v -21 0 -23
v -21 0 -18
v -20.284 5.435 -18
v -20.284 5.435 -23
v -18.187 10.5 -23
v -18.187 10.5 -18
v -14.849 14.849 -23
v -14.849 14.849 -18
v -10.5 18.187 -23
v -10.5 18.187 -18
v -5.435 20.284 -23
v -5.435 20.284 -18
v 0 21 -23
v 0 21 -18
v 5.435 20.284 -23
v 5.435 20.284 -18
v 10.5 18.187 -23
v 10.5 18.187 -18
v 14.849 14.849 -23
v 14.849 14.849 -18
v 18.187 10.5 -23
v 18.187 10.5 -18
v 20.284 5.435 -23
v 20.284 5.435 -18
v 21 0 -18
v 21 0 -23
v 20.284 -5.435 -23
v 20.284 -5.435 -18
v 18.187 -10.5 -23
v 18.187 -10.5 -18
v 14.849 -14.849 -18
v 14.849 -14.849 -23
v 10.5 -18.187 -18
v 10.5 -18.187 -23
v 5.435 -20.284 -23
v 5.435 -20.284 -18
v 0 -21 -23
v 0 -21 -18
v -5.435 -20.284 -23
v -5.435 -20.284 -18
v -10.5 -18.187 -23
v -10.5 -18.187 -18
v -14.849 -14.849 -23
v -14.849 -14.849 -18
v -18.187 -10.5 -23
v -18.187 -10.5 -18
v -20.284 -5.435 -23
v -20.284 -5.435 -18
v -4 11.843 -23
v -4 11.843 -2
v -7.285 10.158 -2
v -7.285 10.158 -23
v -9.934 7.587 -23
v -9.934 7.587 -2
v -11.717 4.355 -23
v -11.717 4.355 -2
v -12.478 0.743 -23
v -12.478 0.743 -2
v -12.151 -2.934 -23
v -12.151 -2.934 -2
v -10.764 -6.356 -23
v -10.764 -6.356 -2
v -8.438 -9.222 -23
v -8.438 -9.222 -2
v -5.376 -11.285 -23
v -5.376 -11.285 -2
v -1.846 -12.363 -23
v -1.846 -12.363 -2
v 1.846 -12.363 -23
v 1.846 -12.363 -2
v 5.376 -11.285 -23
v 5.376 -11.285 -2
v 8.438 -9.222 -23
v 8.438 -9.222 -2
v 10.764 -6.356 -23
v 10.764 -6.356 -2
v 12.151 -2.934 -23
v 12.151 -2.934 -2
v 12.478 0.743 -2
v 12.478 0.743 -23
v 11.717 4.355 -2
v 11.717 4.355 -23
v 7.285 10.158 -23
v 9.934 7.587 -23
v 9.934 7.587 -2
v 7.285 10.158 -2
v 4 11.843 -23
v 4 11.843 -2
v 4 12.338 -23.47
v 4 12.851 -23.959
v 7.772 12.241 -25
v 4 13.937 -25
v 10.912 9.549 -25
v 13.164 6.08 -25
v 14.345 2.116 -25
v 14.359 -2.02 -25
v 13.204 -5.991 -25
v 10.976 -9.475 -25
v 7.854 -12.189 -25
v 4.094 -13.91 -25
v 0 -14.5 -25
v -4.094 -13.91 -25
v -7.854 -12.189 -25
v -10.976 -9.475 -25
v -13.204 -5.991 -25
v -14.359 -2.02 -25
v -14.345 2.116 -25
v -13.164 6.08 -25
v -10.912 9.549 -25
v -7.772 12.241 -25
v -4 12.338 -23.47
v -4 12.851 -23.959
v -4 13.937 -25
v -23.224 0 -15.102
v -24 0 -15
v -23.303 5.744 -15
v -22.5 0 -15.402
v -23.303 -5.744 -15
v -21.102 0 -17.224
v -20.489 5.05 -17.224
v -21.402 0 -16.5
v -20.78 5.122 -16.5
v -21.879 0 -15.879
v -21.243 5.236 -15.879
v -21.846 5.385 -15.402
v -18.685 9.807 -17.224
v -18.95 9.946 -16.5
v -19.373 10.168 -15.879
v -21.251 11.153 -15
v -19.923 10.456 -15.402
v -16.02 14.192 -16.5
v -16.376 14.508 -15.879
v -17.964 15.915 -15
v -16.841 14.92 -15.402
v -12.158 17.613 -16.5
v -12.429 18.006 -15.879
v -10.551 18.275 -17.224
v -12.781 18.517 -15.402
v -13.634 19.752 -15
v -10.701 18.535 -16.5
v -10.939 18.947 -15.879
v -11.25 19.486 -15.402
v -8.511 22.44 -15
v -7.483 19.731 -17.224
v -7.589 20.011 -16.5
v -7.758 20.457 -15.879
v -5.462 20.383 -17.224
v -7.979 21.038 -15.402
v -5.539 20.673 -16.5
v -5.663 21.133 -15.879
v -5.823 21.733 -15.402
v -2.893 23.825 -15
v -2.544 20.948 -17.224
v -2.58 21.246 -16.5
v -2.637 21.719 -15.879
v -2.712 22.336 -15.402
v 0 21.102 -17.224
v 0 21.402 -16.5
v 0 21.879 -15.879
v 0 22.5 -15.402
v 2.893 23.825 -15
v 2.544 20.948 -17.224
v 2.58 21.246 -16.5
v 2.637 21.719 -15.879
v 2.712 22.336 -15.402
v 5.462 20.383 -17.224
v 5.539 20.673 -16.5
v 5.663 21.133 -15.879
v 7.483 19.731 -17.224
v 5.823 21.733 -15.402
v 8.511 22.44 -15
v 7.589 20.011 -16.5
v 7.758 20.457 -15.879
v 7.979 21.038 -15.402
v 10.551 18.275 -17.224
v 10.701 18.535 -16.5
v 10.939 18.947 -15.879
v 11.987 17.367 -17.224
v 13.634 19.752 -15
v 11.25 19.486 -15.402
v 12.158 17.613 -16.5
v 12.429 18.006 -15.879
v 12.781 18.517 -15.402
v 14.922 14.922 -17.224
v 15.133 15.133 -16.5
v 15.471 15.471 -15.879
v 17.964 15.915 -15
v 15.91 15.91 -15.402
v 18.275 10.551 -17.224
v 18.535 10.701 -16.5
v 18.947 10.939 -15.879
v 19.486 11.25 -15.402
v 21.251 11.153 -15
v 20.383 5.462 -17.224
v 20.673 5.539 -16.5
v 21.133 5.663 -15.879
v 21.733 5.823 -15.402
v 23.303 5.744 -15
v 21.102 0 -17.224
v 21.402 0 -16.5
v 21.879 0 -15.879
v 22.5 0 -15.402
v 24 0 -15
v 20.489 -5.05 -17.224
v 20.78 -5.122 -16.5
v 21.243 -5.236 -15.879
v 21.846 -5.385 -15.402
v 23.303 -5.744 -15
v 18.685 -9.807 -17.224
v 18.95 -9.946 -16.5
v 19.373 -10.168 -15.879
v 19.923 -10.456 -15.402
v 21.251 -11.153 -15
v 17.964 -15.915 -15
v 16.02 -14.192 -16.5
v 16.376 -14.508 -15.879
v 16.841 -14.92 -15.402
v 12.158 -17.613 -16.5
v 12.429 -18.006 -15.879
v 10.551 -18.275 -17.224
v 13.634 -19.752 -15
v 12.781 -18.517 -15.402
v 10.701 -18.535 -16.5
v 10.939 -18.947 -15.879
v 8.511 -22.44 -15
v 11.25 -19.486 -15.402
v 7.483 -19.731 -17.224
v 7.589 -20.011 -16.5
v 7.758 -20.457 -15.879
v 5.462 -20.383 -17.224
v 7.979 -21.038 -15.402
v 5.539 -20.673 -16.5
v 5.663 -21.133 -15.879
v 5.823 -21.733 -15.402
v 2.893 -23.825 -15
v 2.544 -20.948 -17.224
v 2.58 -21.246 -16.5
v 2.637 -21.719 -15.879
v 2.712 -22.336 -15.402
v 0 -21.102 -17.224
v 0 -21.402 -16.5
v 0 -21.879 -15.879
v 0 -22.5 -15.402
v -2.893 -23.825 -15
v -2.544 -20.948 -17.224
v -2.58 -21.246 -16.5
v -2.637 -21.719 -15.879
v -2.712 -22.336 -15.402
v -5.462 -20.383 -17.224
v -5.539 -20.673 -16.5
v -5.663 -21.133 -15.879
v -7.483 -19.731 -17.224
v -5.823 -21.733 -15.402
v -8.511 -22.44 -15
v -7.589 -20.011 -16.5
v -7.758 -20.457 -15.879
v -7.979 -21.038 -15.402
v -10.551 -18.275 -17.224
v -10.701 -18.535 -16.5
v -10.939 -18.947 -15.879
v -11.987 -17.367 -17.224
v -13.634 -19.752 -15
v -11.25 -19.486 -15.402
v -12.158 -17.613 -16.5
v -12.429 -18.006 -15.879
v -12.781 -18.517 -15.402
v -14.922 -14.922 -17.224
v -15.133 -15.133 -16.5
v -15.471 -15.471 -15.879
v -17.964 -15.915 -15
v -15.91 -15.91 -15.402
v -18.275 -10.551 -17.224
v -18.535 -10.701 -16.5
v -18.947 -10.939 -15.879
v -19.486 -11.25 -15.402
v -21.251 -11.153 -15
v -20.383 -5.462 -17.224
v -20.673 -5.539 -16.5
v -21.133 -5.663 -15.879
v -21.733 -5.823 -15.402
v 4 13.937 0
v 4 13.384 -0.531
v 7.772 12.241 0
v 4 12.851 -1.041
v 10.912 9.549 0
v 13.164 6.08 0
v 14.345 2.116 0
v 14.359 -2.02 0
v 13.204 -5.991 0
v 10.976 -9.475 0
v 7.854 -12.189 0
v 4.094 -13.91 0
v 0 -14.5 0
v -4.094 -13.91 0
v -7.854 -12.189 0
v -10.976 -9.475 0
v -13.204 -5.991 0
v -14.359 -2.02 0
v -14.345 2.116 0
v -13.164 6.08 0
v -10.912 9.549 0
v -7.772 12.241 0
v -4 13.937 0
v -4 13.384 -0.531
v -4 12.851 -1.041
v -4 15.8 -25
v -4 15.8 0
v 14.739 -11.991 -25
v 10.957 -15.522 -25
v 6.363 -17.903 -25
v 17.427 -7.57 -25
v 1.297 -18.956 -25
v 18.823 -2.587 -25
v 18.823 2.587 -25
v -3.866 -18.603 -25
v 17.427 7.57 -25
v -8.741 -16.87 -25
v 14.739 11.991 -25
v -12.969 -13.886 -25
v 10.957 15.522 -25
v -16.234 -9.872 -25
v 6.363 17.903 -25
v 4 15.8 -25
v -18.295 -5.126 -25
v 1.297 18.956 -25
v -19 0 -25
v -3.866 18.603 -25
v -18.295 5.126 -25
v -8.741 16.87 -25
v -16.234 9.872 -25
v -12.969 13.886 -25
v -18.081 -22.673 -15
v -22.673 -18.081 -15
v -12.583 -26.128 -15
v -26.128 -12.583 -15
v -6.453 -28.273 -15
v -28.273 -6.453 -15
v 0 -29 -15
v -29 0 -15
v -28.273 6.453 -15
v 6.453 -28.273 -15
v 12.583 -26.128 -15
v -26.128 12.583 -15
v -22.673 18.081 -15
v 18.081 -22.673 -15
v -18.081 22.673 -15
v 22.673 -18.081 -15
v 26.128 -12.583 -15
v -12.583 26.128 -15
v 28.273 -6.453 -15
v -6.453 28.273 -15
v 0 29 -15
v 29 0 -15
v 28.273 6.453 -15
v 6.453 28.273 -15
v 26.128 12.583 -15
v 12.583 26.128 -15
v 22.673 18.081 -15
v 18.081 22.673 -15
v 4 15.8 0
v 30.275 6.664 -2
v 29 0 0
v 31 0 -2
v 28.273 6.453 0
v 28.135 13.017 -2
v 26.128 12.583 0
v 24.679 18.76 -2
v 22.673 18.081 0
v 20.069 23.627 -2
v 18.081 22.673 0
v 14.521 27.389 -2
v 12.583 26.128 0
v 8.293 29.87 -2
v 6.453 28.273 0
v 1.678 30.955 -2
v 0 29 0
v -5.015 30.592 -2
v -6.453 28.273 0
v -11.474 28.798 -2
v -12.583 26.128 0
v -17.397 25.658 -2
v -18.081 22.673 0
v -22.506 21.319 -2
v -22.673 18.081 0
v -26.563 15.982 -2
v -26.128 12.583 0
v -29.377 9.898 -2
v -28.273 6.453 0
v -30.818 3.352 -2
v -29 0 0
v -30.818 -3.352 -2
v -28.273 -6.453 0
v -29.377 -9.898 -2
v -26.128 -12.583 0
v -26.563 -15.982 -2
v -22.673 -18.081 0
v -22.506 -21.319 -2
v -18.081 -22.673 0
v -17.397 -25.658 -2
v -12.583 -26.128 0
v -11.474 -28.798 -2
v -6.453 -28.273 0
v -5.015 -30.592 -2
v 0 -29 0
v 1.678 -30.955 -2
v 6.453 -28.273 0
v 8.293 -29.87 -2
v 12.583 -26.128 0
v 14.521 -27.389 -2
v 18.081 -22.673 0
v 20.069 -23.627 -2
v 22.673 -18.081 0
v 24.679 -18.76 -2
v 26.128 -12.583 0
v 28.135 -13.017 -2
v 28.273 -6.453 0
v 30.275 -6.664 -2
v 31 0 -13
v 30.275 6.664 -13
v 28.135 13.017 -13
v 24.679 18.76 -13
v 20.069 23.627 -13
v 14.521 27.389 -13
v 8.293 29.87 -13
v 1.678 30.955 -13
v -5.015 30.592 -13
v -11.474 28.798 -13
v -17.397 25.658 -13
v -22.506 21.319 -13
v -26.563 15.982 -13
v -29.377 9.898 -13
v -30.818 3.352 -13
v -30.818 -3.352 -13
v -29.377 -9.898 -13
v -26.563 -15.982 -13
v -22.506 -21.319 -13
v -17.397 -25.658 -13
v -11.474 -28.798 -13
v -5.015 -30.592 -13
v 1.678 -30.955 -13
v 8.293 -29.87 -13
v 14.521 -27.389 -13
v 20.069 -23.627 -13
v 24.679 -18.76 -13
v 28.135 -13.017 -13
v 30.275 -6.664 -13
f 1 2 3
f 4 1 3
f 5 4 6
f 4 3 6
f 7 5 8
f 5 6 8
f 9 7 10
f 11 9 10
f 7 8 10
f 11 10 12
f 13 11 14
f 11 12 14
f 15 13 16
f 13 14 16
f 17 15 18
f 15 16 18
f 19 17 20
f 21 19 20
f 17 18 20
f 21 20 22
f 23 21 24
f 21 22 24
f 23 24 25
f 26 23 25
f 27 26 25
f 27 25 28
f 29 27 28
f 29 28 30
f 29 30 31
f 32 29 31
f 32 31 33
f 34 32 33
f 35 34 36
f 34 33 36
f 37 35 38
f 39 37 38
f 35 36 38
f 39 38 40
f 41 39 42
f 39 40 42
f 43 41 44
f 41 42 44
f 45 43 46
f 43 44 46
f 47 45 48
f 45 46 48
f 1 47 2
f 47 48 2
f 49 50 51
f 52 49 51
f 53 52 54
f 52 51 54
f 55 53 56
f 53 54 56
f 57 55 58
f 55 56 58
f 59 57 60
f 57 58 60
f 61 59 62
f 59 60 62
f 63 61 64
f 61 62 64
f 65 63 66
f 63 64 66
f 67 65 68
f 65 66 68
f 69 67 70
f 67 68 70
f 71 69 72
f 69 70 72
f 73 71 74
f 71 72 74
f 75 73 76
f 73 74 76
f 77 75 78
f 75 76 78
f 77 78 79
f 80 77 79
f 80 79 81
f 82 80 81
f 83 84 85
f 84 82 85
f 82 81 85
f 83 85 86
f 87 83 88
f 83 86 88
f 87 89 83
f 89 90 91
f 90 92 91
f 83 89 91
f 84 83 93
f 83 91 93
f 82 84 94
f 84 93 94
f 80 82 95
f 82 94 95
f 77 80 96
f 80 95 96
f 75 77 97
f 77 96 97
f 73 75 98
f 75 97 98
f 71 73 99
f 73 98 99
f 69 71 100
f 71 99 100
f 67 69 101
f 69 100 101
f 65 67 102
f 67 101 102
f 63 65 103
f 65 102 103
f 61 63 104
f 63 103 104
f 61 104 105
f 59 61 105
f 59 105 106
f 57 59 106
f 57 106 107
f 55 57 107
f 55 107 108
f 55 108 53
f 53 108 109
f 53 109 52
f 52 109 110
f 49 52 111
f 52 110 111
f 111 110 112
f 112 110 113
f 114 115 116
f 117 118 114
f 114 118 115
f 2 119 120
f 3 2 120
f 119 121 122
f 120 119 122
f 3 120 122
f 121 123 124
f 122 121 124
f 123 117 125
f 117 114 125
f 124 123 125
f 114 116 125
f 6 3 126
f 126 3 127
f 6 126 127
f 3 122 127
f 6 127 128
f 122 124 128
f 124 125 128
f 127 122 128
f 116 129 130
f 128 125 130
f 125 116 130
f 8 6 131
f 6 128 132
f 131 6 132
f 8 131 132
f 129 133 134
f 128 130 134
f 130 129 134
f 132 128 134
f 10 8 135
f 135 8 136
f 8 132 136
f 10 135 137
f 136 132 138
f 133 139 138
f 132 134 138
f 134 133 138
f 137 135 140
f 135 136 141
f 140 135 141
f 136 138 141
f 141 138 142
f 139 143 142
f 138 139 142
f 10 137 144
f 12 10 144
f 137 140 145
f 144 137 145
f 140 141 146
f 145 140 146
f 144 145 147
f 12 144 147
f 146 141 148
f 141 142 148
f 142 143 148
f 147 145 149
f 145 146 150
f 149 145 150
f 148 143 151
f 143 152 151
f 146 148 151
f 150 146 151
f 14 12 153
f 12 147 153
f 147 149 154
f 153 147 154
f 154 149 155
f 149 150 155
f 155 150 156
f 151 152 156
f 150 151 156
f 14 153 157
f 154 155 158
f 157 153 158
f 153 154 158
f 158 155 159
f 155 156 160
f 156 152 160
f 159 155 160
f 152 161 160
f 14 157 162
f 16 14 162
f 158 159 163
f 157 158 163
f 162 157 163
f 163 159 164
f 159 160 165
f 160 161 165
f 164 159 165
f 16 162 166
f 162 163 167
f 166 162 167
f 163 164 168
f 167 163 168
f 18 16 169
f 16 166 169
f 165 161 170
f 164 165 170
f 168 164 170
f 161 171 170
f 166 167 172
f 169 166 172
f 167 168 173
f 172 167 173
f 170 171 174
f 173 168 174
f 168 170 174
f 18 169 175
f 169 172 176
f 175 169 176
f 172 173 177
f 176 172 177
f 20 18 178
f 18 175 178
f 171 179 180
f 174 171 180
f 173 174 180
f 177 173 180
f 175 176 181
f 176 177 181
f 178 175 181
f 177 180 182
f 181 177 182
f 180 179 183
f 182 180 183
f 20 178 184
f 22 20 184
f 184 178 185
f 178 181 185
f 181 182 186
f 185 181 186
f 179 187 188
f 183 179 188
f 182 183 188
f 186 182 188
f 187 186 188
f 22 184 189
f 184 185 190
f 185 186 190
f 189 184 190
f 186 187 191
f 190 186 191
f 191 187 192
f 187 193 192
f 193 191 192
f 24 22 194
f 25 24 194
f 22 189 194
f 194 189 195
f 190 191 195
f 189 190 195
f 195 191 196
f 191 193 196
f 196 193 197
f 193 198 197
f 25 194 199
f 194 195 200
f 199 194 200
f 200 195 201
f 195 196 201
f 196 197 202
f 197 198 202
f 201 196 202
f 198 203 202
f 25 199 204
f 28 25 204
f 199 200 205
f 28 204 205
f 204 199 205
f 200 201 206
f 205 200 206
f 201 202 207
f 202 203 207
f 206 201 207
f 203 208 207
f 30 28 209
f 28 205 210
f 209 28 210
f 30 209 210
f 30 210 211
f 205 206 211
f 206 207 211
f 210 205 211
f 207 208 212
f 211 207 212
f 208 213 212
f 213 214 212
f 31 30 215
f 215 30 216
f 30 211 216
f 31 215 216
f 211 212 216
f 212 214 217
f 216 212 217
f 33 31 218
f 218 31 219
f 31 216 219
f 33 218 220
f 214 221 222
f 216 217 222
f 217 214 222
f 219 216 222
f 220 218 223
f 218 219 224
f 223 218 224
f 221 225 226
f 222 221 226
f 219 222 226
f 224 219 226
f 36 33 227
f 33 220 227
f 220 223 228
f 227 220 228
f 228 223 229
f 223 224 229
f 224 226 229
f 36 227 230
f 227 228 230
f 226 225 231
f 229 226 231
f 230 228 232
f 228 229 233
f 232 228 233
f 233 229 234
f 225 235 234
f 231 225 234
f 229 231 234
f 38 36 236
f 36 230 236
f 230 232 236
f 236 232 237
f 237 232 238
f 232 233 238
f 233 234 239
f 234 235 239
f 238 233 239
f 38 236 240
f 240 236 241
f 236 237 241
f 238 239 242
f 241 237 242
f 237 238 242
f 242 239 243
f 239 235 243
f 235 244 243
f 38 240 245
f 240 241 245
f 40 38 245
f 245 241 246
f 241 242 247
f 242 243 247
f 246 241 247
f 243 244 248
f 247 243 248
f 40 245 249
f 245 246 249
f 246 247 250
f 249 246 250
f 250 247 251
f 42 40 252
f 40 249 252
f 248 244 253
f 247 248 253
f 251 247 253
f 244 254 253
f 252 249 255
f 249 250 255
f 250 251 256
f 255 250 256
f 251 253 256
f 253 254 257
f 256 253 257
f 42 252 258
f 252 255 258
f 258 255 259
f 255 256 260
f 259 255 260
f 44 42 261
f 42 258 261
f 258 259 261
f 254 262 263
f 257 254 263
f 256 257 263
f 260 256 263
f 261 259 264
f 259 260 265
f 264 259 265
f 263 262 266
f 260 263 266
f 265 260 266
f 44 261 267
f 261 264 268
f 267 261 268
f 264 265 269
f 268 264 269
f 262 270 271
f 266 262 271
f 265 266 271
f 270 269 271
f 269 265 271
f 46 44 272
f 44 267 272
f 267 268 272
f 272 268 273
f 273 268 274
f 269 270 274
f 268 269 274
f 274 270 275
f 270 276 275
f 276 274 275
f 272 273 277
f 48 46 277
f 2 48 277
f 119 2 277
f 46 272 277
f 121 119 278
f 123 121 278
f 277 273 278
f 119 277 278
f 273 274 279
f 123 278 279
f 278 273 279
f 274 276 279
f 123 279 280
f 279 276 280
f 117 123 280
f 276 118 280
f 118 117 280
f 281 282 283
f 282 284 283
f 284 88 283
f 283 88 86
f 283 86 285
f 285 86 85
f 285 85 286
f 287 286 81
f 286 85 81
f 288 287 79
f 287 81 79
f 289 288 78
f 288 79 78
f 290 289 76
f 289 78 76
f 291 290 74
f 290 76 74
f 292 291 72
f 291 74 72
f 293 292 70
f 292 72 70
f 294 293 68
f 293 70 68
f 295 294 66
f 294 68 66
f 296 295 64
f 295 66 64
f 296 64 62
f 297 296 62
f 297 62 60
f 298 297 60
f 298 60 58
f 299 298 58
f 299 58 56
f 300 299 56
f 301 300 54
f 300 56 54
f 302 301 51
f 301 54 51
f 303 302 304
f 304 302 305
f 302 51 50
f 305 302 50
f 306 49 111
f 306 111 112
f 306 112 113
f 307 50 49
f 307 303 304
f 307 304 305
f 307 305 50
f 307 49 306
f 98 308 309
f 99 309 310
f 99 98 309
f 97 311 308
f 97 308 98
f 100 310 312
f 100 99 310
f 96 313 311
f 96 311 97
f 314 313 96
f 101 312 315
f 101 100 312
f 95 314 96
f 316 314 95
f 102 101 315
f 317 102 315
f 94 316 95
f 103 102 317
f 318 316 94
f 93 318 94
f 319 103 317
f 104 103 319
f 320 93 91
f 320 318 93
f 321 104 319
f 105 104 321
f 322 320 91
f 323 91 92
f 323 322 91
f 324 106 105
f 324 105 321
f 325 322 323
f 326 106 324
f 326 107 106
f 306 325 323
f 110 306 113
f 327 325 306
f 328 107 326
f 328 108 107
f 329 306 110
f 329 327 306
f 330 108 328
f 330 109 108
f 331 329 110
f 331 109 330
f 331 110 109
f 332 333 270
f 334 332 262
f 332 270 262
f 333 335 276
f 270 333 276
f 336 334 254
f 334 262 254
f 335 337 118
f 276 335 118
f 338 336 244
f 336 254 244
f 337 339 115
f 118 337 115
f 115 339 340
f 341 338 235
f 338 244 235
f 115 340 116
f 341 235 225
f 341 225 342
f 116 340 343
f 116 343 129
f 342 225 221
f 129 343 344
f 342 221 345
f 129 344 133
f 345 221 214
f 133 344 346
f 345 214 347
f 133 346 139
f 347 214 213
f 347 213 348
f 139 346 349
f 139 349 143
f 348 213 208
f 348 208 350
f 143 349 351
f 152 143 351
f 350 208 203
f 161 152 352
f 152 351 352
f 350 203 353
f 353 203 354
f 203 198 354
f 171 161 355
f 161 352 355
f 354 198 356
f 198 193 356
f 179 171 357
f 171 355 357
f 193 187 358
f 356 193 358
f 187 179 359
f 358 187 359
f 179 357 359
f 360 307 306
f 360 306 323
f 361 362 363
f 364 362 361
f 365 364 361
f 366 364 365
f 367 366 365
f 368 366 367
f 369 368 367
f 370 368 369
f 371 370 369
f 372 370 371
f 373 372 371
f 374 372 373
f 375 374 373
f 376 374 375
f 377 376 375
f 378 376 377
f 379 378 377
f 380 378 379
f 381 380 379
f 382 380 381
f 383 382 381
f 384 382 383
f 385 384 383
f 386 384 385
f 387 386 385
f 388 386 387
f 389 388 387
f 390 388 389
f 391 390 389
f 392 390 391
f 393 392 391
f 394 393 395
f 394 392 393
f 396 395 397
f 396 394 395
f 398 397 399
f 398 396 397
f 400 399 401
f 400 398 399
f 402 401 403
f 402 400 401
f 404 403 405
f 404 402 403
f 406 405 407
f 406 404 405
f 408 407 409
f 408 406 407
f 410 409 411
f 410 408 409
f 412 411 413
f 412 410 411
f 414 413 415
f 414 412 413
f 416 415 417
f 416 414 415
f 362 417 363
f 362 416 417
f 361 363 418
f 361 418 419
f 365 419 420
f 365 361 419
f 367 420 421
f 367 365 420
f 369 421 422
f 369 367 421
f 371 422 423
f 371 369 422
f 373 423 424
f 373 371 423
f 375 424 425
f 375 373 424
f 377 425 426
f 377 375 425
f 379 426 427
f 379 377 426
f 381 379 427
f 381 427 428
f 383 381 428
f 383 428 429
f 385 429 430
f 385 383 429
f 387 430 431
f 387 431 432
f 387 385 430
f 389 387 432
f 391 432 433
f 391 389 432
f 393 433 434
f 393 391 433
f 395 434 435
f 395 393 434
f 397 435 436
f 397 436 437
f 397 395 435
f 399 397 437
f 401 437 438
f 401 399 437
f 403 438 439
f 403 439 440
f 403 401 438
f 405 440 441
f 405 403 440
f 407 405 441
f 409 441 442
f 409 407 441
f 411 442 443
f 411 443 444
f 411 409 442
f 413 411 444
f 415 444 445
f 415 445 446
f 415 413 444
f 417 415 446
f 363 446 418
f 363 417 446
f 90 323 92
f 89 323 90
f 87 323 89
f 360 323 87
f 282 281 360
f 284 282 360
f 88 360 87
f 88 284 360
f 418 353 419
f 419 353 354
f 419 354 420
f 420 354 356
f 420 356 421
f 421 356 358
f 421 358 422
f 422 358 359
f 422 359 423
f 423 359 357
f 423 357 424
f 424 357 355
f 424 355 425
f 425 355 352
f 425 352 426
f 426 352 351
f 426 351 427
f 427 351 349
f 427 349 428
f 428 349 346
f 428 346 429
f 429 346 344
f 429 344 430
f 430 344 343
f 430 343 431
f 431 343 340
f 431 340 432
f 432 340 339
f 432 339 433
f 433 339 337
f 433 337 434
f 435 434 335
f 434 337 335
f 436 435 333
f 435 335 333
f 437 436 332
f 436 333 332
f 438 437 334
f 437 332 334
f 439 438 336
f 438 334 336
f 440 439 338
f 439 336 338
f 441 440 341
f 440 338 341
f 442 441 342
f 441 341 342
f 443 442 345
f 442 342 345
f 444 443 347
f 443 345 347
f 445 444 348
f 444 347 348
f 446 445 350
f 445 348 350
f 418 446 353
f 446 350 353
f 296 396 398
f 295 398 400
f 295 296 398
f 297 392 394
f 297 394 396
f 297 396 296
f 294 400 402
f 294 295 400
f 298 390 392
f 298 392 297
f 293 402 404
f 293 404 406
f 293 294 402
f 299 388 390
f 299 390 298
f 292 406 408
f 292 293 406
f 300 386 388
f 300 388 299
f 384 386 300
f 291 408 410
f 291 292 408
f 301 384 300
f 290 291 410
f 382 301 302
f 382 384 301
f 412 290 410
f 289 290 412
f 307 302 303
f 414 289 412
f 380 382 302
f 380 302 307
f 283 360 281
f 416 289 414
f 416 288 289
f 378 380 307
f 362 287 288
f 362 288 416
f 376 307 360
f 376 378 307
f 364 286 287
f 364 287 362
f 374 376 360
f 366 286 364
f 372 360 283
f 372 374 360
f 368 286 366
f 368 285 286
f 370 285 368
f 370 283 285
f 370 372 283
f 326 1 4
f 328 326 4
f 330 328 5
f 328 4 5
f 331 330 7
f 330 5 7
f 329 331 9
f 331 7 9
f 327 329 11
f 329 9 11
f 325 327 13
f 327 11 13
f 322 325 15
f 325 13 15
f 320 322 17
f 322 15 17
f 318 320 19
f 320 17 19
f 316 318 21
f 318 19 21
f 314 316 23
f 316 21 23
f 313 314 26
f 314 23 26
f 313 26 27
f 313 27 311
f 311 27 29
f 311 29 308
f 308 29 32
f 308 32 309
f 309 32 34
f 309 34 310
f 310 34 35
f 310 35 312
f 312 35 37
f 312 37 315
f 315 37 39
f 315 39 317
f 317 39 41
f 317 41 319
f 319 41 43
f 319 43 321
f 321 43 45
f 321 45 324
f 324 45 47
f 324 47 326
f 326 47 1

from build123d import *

# Parameters (mm, degrees)
SKETCH_1_R          = 31
EXTRUDE_1_DEPTH     = 15
SKETCH_2_R          = 21
EXTRUDE_2_DEPTH     = 10
SKETCH_3_R          = 12.5
CUT_EXTRUDE_1_DEPTH = 51.467811524
CUT_EXTRUDE_3_DEPTH = 51.467811524
CHAMFER_1_SIZE      = 2
CHAMFER_2_SIZE      = 2
CHAMFER_3_SIZE      = 2
CHAMFER_4_SIZE      = 2
CHAMFER_5_SIZE      = 2
FILLET_1_R          = 3


with BuildPart() as part:
    # 草图1 → 凸台-拉伸1 (new body)
    with BuildSketch(Plane.XY):
        Circle(SKETCH_1_R)
    extrude(amount=-EXTRUDE_1_DEPTH)

    # 草图2 → 凸台-拉伸2 (add)
    with BuildSketch(Plane(origin=(0, 0, -15), x_dir=(-1, 0, 0), z_dir=(0, 0, -1))):
        Circle(SKETCH_2_R)
    extrude(amount=EXTRUDE_2_DEPTH)

    # 草图3 → 切除-拉伸1 (cut, through all)
    with BuildSketch(Plane.XY):
        Circle(SKETCH_3_R)
    extrude(amount=-CUT_EXTRUDE_1_DEPTH, mode=Mode.SUBTRACT)

    # 草图4 → 切除-拉伸3 (cut, through all)
    with BuildSketch(Plane.XY):
        with BuildLine():
            Line((0, 15.8), (4, 15.8))
            Line((4, 15.8), (4, 11.842719282))
            ThreePointArc((4, 11.842719282), (0, 12.5), (-4, 11.842719282))
            Line((-4, 11.842719282), (-4, 15.8))
            Line((-4, 15.8), (0, 15.8))
        make_face()
    extrude(amount=-CUT_EXTRUDE_3_DEPTH, mode=Mode.SUBTRACT)

    # 倒角1
    chamfer_1_edges = [part.edges().sort_by_distance(p)[0] for p in [
        (-31, 0, 0),
    ]]
    chamfer(chamfer_1_edges, length=CHAMFER_1_SIZE)

    # 倒角2
    chamfer_2_edges = [part.edges().sort_by_distance(p)[0] for p in [
        (-31, 0, -15),
    ]]
    chamfer(chamfer_2_edges, length=CHAMFER_2_SIZE)

    # 倒角3
    chamfer_3_edges = [part.edges().sort_by_distance(p)[0] for p in [
        (0, -12.5, 0),
    ]]
    chamfer(chamfer_3_edges, length=CHAMFER_3_SIZE)

    # 倒角4
    chamfer_4_edges = [part.edges().sort_by_distance(p)[0] for p in [
        (0, -12.5, -25),
    ]]
    chamfer(chamfer_4_edges, length=CHAMFER_4_SIZE)

    # 倒角5
    chamfer_5_edges = [part.edges().sort_by_distance(p)[0] for p in [
        (21, 0, -25),
    ]]
    chamfer(chamfer_5_edges, length=CHAMFER_5_SIZE)

    # 圆角1
    fillet_1_edges = [part.edges().sort_by_distance(p)[0] for p in [
        (21, 0, -15),
    ]]
    fillet(fillet_1_edges, radius=FILLET_1_R)


solid = part.part
